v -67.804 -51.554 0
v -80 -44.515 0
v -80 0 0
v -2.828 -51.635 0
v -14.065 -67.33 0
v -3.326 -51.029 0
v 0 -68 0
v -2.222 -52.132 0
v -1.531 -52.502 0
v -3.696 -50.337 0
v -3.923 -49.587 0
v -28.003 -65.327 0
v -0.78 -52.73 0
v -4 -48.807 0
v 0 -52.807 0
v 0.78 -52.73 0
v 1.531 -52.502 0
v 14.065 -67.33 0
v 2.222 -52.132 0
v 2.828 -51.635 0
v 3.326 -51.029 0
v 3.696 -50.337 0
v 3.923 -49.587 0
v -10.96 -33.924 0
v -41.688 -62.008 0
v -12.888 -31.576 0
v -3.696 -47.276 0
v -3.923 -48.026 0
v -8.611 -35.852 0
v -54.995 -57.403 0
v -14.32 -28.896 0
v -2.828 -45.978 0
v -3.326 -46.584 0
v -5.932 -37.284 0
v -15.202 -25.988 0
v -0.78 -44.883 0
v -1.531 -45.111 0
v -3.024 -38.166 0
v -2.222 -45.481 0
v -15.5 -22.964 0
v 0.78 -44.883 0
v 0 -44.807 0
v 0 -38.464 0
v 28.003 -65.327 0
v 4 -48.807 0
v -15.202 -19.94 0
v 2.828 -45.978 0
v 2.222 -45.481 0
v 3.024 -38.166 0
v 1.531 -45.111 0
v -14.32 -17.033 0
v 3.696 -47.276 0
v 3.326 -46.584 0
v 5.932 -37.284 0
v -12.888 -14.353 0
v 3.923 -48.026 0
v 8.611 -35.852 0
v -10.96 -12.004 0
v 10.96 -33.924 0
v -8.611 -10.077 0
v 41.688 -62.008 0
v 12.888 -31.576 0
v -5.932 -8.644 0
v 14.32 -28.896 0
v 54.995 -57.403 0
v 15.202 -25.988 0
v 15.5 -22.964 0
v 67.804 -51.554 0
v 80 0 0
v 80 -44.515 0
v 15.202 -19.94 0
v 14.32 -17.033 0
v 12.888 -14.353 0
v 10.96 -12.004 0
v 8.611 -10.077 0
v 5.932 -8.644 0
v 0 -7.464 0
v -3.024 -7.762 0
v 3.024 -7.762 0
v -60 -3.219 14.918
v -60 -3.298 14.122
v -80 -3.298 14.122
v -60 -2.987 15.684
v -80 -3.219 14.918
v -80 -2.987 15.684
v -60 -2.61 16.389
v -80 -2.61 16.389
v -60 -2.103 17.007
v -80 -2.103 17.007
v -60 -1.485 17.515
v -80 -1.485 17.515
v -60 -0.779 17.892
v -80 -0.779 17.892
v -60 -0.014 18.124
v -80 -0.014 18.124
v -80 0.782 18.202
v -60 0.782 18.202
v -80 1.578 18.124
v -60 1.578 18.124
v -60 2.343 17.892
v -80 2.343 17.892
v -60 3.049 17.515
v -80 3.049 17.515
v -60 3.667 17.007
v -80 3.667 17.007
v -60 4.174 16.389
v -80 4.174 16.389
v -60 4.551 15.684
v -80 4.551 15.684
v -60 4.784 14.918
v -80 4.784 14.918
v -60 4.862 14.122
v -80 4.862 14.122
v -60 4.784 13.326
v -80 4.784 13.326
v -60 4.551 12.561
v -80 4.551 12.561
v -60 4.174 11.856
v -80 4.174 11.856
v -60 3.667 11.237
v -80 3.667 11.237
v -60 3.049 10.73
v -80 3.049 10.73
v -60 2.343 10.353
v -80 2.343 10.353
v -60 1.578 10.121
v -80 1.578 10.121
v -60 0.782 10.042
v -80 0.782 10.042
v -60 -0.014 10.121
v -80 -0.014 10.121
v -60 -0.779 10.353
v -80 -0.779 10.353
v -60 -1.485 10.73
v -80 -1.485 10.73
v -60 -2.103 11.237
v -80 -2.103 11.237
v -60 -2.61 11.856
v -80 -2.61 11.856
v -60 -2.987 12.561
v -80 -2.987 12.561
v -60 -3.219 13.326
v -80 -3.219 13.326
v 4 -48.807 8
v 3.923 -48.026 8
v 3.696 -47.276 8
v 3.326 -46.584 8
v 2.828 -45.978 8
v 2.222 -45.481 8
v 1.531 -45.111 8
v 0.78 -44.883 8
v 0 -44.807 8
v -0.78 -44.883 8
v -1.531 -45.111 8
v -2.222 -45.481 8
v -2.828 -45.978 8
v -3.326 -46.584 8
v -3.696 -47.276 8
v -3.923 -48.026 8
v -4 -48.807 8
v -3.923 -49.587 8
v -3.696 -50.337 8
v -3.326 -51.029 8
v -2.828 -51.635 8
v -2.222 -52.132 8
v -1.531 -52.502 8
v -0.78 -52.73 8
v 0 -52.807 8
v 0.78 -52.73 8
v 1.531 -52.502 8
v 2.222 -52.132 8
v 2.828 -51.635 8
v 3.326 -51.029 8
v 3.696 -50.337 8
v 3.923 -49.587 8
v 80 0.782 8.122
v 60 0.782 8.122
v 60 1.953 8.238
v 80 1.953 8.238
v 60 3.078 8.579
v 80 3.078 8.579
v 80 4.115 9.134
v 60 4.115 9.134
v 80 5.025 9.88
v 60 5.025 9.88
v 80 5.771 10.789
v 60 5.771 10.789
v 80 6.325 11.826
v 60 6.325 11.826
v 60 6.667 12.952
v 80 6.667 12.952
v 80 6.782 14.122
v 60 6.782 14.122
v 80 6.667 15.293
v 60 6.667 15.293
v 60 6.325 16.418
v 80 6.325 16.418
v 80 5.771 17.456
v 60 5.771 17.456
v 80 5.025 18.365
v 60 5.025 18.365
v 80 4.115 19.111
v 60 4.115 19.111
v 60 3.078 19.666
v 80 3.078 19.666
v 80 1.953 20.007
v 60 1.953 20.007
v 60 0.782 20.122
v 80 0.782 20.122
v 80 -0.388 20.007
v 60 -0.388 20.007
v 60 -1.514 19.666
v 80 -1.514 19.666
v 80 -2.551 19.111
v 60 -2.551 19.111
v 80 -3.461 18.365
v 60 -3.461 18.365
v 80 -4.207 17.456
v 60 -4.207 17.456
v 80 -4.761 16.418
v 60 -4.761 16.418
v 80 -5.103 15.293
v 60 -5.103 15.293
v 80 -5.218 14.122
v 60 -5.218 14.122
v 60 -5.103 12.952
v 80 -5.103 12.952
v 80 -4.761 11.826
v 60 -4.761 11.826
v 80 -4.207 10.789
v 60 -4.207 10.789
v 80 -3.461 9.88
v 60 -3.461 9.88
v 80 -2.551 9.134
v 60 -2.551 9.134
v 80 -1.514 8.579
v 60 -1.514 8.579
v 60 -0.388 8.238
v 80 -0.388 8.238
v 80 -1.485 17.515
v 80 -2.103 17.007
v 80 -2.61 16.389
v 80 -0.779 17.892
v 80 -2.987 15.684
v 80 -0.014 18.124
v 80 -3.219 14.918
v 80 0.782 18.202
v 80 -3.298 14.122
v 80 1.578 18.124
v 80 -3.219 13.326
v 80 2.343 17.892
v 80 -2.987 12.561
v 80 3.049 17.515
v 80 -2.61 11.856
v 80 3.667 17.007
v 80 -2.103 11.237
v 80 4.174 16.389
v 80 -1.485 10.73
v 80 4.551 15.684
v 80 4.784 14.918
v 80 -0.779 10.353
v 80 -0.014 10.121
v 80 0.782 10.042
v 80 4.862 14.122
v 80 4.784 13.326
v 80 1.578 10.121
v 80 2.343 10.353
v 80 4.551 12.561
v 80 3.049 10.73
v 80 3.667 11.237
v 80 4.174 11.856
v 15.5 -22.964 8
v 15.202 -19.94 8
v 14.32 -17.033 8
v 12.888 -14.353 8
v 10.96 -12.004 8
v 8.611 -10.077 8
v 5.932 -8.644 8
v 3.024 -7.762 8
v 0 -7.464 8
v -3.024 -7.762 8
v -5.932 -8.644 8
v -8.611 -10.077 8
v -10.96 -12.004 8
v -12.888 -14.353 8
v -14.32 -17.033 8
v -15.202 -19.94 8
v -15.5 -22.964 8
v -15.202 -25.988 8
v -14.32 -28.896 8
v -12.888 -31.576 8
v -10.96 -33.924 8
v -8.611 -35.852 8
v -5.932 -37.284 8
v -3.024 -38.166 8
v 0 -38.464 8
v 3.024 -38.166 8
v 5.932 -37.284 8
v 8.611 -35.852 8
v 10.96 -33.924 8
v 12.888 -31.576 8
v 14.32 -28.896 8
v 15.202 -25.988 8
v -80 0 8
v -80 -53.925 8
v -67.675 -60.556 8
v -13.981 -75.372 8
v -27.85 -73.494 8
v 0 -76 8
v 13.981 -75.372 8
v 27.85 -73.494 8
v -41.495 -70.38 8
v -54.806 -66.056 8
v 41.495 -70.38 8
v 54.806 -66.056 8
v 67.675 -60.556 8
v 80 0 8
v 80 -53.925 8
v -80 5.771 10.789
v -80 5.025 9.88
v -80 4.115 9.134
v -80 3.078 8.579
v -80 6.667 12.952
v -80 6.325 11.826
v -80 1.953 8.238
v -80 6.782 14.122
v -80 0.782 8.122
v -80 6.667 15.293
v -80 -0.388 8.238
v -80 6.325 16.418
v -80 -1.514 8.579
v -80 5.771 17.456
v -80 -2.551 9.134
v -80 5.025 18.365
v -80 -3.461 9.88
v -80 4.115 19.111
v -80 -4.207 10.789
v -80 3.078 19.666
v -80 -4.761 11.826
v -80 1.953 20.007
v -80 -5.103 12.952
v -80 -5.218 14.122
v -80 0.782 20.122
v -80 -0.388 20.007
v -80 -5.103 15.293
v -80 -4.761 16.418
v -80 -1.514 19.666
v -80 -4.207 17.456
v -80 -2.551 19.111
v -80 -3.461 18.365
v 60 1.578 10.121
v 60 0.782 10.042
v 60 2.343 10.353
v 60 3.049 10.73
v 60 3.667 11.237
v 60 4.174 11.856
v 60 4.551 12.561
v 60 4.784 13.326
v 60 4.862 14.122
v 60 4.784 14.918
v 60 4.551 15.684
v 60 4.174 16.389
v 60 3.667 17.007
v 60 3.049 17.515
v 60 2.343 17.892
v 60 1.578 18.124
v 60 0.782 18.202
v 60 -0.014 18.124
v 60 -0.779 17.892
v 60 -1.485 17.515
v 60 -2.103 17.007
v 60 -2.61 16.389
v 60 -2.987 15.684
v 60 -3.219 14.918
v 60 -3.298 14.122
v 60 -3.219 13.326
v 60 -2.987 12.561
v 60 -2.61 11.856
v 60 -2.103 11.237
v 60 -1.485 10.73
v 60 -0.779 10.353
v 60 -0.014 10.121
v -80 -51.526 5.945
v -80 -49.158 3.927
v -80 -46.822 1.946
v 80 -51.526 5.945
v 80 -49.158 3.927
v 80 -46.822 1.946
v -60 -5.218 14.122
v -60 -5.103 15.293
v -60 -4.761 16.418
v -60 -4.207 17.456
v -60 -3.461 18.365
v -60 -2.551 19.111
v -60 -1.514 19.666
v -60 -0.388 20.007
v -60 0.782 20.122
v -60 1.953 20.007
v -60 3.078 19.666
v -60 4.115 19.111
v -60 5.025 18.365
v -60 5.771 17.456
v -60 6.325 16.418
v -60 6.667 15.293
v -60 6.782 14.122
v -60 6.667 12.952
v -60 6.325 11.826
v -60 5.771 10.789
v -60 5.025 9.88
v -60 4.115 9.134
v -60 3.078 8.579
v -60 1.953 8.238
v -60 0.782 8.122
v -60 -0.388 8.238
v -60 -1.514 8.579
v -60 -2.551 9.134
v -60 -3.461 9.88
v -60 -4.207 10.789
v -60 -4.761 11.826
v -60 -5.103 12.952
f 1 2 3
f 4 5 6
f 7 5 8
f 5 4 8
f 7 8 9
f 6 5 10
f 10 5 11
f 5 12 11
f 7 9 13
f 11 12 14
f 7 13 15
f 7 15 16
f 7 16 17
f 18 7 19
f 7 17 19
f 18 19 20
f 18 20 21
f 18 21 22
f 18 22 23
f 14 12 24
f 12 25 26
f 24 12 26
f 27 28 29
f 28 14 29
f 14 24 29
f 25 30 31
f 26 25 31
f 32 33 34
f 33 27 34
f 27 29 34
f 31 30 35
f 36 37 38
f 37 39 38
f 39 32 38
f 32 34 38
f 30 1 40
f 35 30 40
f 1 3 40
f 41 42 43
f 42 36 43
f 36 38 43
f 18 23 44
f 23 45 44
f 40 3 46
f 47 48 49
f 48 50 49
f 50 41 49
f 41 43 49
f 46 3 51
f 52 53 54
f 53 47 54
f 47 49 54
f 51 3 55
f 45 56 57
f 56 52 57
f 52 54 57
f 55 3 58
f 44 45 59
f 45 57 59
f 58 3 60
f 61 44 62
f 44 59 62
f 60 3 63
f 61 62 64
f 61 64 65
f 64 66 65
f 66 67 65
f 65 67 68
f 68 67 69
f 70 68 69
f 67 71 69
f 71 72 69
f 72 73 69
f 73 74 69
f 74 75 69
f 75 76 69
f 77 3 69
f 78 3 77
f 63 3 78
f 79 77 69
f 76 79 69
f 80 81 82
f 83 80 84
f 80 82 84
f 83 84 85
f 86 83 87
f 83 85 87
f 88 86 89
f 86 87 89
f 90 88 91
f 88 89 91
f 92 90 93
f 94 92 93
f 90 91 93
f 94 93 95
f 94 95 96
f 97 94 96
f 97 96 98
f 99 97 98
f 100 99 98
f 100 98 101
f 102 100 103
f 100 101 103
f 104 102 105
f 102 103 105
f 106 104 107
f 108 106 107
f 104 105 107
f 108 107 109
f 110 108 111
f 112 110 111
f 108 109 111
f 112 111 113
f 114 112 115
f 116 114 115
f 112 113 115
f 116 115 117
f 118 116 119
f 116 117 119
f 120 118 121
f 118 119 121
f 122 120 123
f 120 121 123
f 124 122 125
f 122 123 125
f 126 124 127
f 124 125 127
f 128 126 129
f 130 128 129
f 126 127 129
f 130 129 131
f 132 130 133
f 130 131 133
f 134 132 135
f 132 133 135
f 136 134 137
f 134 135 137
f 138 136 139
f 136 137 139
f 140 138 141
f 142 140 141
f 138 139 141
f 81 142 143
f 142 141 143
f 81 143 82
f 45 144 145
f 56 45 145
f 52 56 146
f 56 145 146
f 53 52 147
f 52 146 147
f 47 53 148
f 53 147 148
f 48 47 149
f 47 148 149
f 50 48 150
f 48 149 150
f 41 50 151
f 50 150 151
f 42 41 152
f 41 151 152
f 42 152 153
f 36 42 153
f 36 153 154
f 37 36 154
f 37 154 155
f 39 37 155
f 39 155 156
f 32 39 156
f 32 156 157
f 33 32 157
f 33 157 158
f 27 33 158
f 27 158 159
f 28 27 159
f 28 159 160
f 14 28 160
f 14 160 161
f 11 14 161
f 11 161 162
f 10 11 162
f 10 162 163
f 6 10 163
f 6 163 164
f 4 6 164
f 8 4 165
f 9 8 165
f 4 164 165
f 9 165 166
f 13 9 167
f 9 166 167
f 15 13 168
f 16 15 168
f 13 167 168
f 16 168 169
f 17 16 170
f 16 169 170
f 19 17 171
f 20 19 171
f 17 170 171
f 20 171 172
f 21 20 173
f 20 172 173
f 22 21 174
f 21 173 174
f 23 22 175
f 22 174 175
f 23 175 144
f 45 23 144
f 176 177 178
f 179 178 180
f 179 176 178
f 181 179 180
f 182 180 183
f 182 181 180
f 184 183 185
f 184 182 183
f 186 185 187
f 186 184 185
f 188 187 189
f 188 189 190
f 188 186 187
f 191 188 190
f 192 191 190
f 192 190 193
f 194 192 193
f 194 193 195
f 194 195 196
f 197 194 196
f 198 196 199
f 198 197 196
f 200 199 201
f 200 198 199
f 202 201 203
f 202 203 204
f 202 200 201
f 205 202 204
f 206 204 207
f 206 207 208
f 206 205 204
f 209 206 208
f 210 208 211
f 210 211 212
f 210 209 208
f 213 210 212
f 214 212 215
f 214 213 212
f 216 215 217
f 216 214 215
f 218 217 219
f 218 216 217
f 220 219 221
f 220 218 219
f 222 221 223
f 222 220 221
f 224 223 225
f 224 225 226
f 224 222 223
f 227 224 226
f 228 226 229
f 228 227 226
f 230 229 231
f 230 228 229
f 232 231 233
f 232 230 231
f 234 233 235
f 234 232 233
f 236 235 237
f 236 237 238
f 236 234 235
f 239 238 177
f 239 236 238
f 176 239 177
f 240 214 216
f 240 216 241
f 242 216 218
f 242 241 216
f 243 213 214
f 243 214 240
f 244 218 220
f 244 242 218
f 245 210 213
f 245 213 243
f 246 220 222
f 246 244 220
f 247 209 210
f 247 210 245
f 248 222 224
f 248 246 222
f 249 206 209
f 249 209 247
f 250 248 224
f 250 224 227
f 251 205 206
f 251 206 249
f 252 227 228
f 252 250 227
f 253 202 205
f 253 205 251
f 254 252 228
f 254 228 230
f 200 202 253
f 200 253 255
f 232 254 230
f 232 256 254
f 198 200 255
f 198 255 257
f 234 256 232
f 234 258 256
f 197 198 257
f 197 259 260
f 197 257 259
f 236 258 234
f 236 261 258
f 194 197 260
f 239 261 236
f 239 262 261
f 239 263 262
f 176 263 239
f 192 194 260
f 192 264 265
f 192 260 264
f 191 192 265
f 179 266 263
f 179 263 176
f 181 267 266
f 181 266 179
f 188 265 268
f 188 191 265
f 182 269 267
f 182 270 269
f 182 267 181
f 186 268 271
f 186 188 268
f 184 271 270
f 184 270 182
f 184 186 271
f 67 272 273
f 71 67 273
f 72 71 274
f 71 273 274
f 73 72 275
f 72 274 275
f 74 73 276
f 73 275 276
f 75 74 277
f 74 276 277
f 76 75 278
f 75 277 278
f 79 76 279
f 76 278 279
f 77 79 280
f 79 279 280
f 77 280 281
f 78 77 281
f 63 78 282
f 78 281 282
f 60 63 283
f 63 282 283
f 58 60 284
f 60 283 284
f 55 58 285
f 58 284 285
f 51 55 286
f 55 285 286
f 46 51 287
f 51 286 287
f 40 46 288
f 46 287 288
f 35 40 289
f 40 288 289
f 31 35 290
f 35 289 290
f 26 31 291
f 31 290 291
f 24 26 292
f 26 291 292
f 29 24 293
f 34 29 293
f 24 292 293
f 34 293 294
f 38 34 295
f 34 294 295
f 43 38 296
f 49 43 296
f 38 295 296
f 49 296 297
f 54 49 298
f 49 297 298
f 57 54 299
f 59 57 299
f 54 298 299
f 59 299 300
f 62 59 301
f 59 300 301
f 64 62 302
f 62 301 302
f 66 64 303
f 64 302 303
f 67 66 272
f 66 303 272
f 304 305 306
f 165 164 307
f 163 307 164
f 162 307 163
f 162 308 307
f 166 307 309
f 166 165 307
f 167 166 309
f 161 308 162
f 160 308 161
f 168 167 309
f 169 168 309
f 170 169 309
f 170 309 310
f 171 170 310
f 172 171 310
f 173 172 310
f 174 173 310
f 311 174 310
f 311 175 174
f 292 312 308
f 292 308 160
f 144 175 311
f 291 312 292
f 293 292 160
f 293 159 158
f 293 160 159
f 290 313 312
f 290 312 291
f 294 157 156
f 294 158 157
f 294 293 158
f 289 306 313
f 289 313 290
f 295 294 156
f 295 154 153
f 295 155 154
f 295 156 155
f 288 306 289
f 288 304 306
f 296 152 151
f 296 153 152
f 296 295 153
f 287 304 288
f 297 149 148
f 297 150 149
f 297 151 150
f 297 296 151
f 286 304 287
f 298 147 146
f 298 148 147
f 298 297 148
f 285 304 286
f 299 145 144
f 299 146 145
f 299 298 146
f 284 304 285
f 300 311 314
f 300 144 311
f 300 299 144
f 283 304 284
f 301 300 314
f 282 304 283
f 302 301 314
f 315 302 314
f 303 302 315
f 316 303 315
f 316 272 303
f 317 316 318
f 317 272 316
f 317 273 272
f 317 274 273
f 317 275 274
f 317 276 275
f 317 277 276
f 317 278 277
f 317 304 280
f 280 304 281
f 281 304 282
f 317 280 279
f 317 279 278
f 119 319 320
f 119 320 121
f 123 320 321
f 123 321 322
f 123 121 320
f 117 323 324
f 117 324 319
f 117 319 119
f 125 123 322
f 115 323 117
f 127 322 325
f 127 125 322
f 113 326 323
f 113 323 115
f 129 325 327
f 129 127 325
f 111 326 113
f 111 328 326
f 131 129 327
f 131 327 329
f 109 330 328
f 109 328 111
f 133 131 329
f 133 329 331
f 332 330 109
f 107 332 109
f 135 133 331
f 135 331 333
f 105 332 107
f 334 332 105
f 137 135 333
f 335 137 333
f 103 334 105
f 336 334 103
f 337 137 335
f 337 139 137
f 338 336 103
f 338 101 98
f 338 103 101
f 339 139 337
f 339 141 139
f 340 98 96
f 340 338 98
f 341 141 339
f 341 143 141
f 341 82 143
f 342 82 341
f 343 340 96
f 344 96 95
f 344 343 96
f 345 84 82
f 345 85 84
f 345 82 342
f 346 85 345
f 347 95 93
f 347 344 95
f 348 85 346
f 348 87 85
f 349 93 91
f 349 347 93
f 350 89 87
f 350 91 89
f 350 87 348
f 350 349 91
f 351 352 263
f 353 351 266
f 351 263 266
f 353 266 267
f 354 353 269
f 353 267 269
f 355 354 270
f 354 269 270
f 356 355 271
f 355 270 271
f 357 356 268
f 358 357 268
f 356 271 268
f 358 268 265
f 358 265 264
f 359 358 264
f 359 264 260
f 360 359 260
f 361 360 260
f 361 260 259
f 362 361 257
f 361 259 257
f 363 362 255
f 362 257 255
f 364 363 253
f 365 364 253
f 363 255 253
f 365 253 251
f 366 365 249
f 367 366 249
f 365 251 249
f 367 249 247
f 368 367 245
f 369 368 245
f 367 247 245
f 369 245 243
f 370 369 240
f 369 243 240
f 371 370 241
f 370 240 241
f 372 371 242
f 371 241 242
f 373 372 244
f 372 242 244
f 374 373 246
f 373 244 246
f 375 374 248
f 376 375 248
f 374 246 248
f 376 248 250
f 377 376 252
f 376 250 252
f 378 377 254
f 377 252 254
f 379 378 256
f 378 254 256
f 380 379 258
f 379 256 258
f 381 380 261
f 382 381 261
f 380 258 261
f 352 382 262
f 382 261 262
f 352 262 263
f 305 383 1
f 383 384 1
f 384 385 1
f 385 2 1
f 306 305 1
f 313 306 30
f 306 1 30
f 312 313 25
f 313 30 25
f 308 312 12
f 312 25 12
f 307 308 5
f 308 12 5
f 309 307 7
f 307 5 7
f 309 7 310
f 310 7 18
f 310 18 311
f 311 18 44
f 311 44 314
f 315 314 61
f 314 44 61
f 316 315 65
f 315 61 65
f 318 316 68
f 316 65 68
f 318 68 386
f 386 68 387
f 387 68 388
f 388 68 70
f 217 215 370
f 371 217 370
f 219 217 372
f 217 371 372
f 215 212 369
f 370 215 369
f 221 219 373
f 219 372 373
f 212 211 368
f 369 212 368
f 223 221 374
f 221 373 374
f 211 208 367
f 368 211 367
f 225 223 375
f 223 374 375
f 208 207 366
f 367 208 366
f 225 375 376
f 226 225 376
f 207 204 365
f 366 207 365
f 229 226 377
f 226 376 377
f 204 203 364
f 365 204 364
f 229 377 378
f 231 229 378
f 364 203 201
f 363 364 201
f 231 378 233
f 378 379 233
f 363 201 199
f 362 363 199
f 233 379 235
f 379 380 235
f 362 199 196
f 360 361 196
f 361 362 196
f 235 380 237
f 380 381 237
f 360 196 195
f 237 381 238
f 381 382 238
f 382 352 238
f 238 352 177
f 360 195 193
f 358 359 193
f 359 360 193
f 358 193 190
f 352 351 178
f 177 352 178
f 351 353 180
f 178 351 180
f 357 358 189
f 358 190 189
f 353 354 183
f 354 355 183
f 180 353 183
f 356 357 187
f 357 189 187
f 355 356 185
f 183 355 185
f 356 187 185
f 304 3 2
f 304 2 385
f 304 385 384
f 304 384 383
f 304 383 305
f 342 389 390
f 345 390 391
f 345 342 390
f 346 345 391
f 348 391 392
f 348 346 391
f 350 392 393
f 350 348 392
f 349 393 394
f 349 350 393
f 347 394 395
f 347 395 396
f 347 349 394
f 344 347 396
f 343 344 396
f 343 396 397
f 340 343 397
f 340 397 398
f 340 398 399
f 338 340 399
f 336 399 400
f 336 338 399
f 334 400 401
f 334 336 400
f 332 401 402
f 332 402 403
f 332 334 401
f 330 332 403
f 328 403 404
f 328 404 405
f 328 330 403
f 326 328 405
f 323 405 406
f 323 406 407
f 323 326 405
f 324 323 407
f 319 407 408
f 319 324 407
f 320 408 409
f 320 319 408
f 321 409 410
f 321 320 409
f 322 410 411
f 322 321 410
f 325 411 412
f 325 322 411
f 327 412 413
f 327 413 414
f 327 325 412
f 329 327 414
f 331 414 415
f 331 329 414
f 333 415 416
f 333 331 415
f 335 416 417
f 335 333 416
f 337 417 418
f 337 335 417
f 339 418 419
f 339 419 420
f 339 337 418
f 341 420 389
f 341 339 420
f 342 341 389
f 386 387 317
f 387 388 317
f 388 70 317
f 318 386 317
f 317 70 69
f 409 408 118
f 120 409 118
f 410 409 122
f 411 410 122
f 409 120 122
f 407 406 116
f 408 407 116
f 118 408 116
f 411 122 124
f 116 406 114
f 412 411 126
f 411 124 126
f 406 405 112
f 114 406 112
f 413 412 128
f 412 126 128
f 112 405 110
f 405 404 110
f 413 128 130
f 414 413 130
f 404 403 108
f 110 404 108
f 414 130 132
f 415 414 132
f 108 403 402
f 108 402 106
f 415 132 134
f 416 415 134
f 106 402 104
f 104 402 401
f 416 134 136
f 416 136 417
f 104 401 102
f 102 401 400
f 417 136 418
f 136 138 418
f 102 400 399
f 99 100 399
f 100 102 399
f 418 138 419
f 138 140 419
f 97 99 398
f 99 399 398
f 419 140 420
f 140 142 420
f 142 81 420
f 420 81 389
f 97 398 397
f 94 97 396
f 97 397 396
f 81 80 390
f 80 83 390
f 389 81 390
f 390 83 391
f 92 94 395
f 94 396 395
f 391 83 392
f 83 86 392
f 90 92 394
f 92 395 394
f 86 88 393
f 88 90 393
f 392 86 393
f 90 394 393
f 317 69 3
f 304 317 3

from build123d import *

# Parameters (mm, degrees)
BOSS_EXTRUDE1_DEPTH = 8
SKETCH2_R           = 15.5
CUT_EXTRUDE1_DEPTH  = 8
CHAMFER1_SIZE       = 8
SKETCH3_R           = 4
CUT_EXTRUDE2_DEPTH  = 60
SKETCH4_R           = 6
SKETCH4_R_2         = 4.079964081
BOSS_EXTRUDE2_DEPTH = 20
SKETCH5_R           = 6
SKETCH5_R_2         = 4.079964081
BOSS_EXTRUDE3_DEPTH = 20


with BuildPart() as part:
    # Sketch1 → Boss-Extrude1 (new body)
    with BuildSketch(Plane.XY):
        with BuildLine():
            Line((-80, 0), (-80, -53.925352342))
            ThreePointArc((-80, -53.925352342), (0, -76), (80, -53.925352342))
            Line((80, -53.925352342), (80, 0))
            Line((80, 0), (-80, 0))
        make_face()
    extrude(amount=BOSS_EXTRUDE1_DEPTH)

    # Sketch2 → Cut-Extrude1 (cut)
    with BuildSketch(Plane.XY.offset(8)):
        with Locations((0, -22.964297533)):
            Circle(SKETCH2_R)
    extrude(amount=-CUT_EXTRUDE1_DEPTH, mode=Mode.SUBTRACT)

    # Chamfer1
    chamfer1_edges = [part.edges().sort_by_distance(p)[0] for p in [
        (0, -76, 0),
    ]]
    chamfer(chamfer1_edges, length=CHAMFER1_SIZE - 0.0001)  # a hair under: the kernel refuses the full size

    # Sketch3 → Cut-Extrude2 (cut)
    with BuildSketch(Plane.XY.offset(8)):
        with Locations((0, -48.806594288)):
            Circle(SKETCH3_R)
    extrude(amount=-CUT_EXTRUDE2_DEPTH, mode=Mode.SUBTRACT)


with BuildPart() as body_2:
    # Sketch4 → Boss-Extrude2 (new body)
    with BuildSketch(Plane.ZY.offset(80)):
        with Locations(Location((14.122386973, 0.782069774, 0), (0, 0, 270))):
            Circle(SKETCH4_R)
        with Locations(Location((14.122386973, 0.782069774, 0), (0, 0, 270))):
            Circle(SKETCH4_R_2, mode=Mode.SUBTRACT)
    extrude(amount=-BOSS_EXTRUDE2_DEPTH)


with BuildPart() as body_3:
    # Sketch5 → Boss-Extrude3 (new body)
    with BuildSketch(Plane(origin=(80, 0, 0), x_dir=(0, 0, -1), z_dir=(1, 0, 0))):
        with Locations((-14.122386973, 0.782069774)):
            Circle(SKETCH5_R)
        with Locations((-14.122386973, 0.782069774)):
            Circle(SKETCH5_R_2, mode=Mode.SUBTRACT)
    extrude(amount=-BOSS_EXTRUDE3_DEPTH)


solid = Compound([part.part, body_2.part, body_3.part])
